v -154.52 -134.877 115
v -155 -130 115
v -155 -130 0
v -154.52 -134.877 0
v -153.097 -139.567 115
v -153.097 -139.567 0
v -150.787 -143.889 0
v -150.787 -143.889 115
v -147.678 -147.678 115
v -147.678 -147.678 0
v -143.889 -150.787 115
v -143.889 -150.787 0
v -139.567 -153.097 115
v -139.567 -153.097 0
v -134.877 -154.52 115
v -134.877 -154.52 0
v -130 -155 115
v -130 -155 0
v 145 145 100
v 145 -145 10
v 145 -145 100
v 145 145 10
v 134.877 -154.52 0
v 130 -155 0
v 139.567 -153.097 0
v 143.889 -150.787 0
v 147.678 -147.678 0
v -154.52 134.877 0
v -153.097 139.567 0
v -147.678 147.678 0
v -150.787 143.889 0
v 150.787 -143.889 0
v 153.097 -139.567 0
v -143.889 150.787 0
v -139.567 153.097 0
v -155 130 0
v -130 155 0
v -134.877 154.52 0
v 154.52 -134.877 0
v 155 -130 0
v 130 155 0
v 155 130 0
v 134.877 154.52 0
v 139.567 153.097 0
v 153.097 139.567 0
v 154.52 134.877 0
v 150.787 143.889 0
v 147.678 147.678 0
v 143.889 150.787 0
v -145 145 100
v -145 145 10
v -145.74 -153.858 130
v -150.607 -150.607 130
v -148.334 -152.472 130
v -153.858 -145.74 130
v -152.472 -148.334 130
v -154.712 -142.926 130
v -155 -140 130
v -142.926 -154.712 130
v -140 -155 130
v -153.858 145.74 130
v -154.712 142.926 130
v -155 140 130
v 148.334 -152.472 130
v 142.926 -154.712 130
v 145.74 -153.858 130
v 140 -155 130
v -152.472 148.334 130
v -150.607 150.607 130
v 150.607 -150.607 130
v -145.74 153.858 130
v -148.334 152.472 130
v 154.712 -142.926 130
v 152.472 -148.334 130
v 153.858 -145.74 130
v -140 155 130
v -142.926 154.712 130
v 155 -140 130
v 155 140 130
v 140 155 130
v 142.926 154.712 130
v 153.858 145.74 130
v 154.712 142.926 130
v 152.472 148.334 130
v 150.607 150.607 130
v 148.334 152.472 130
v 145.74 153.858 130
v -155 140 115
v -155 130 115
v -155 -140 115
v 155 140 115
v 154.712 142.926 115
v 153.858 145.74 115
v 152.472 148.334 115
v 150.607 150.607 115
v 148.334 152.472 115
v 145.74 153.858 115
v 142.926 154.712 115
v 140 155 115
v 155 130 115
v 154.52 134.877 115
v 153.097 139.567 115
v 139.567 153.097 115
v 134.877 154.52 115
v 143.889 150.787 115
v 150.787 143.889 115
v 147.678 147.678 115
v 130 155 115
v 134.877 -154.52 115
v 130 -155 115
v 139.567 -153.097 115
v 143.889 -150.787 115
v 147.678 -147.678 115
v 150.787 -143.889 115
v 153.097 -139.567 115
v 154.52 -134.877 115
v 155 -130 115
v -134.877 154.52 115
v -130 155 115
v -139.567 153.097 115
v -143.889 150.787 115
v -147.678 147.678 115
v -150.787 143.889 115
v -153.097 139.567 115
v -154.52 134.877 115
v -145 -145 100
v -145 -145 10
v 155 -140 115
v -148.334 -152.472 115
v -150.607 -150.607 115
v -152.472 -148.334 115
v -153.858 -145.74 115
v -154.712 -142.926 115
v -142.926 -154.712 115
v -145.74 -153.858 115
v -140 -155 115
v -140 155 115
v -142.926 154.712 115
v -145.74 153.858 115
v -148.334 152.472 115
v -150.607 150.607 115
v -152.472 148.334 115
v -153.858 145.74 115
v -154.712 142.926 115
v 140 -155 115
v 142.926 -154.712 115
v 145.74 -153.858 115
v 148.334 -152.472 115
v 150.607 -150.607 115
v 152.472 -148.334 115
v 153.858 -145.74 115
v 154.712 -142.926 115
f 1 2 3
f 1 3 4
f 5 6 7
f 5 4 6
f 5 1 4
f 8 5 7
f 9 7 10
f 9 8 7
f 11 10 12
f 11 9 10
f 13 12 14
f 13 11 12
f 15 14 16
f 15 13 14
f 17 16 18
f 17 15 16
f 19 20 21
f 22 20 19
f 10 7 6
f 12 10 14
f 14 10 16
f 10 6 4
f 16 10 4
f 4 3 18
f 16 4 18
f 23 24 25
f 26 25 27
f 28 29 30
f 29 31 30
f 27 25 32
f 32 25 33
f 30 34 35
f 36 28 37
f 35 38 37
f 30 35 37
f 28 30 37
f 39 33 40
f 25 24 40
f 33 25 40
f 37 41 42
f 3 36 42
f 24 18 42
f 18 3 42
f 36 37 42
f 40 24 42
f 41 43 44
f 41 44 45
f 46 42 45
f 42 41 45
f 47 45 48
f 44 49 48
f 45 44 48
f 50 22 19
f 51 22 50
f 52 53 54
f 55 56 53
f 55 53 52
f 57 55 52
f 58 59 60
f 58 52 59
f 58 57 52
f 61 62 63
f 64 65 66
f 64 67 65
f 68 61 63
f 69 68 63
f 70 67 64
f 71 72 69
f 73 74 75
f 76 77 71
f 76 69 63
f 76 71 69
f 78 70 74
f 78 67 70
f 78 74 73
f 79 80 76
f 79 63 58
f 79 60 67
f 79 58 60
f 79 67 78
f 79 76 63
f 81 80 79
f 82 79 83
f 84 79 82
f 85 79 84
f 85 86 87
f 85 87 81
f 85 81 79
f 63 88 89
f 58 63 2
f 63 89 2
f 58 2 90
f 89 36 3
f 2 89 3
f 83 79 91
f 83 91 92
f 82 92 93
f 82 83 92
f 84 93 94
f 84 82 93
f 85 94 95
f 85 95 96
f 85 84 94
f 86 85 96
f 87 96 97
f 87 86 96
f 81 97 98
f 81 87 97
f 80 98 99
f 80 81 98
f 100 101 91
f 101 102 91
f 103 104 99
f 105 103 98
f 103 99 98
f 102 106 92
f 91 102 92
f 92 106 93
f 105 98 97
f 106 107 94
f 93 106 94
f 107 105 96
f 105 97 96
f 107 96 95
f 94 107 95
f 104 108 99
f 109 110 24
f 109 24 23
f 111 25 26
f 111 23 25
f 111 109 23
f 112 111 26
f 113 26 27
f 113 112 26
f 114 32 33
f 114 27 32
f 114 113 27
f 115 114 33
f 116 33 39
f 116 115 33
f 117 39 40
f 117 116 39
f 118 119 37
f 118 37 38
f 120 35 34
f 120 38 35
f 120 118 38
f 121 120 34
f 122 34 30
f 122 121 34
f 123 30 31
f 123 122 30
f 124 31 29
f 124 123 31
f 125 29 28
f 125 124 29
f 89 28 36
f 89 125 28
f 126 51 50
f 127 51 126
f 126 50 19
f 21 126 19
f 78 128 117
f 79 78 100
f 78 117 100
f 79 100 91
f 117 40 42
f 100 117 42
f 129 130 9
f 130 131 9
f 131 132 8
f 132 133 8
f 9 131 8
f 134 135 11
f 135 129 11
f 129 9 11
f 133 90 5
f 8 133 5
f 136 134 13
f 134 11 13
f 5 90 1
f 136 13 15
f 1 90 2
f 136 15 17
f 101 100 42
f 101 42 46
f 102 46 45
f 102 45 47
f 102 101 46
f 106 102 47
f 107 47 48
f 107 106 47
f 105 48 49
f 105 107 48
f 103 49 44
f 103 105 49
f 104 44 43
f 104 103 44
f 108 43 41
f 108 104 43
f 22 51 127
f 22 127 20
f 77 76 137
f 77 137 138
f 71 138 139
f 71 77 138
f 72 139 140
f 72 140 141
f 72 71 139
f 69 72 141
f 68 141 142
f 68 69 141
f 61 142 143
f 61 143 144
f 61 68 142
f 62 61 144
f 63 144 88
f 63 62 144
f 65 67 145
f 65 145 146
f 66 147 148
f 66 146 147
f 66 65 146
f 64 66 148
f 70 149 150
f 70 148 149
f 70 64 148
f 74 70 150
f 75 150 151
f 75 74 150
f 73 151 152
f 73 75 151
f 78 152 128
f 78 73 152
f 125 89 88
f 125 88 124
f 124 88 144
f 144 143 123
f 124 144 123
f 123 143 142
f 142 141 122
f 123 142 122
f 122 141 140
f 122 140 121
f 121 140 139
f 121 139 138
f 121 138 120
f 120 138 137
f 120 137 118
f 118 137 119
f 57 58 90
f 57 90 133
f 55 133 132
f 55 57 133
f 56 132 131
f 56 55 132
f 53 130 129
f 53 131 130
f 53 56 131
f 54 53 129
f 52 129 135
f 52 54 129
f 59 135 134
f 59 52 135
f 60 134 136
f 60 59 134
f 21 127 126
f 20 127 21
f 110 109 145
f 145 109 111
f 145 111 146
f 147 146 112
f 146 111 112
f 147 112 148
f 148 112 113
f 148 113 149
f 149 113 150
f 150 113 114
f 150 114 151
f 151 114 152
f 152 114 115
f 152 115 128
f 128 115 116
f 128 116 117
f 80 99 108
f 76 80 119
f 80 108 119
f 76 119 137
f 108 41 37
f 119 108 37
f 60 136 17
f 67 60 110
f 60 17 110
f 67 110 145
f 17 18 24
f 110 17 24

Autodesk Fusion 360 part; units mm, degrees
sketch "Sketch1" plane through (0, 0, 0) normal (0, 0, 1) x (1, 0, 0)
  line L0 (155, 155) -> (-155, 155)
  line L1 (-155, 155) -> (-155, -155)
  line L2 (-155, -155) -> (155, -155)
  line L3 (155, -155) -> (155, 155)
  line L4 (155, 155) -> (-155, -155) construction
  line L5 (-155, 155) -> (155, -155) construction
  dimension "d1" = 310
  dimension "d2" = 310
extrude "Extrude1" add sketch "Sketch1" along normal blind 115
shell "Shell1" thickness 10 removed faces 1 at (-51.6667, 51.6667, 115)
fillet "Fillet1" radius 25 4 edges at (-155, -155, 57.5) (155, -155, 57.5) (-155, 155, 57.5) (155, 155, 57.5)
ref_plane "WorkPlane1" through (0, 0, 115) normal (0, 0, 1) x (1, 0, 0)
sketch "Sketch2" plane through (0, 0, 115) normal (0, 0, 1) x (1, 0, 0)
  line L0 (155, 155) -> (-155, 155)
  line L1 (-155, 155) -> (-155, -155)
  line L2 (-155, -155) -> (155, -155)
  line L3 (155, -155) -> (155, 155)
  line L4 (155, 155) -> (-155, -155) construction
  line L5 (-155, 155) -> (155, -155) construction
  line L6 (-145, 145) -> (145, 145)
  line L7 (145, 145) -> (145, -145)
  line L8 (145, -145) -> (-145, -145)
  line L9 (-145, -145) -> (-145, 145)
  line L10 (-145, 145) -> (145, -145) construction
  line L11 (145, 145) -> (-145, -145) construction
  dimension "d9" = 310
  dimension "d10" = 310
  dimension "d11" = 290
  dimension "d12" = 290
extrude "Extrude2" add sketch "Sketch2" against normal blind 15 contours L6 L7 L8 L9
extrude "Extrude3" add sketch "Sketch2" along normal blind 15 contours L0 L1 L2 L3 | L6 L7 L8 L9
fillet "Fillet2" radius 15 4 edges at (-155, 155, 122.5) (-155, -155, 122.5) (155, -155, 122.5) (155, 155, 122.5)
